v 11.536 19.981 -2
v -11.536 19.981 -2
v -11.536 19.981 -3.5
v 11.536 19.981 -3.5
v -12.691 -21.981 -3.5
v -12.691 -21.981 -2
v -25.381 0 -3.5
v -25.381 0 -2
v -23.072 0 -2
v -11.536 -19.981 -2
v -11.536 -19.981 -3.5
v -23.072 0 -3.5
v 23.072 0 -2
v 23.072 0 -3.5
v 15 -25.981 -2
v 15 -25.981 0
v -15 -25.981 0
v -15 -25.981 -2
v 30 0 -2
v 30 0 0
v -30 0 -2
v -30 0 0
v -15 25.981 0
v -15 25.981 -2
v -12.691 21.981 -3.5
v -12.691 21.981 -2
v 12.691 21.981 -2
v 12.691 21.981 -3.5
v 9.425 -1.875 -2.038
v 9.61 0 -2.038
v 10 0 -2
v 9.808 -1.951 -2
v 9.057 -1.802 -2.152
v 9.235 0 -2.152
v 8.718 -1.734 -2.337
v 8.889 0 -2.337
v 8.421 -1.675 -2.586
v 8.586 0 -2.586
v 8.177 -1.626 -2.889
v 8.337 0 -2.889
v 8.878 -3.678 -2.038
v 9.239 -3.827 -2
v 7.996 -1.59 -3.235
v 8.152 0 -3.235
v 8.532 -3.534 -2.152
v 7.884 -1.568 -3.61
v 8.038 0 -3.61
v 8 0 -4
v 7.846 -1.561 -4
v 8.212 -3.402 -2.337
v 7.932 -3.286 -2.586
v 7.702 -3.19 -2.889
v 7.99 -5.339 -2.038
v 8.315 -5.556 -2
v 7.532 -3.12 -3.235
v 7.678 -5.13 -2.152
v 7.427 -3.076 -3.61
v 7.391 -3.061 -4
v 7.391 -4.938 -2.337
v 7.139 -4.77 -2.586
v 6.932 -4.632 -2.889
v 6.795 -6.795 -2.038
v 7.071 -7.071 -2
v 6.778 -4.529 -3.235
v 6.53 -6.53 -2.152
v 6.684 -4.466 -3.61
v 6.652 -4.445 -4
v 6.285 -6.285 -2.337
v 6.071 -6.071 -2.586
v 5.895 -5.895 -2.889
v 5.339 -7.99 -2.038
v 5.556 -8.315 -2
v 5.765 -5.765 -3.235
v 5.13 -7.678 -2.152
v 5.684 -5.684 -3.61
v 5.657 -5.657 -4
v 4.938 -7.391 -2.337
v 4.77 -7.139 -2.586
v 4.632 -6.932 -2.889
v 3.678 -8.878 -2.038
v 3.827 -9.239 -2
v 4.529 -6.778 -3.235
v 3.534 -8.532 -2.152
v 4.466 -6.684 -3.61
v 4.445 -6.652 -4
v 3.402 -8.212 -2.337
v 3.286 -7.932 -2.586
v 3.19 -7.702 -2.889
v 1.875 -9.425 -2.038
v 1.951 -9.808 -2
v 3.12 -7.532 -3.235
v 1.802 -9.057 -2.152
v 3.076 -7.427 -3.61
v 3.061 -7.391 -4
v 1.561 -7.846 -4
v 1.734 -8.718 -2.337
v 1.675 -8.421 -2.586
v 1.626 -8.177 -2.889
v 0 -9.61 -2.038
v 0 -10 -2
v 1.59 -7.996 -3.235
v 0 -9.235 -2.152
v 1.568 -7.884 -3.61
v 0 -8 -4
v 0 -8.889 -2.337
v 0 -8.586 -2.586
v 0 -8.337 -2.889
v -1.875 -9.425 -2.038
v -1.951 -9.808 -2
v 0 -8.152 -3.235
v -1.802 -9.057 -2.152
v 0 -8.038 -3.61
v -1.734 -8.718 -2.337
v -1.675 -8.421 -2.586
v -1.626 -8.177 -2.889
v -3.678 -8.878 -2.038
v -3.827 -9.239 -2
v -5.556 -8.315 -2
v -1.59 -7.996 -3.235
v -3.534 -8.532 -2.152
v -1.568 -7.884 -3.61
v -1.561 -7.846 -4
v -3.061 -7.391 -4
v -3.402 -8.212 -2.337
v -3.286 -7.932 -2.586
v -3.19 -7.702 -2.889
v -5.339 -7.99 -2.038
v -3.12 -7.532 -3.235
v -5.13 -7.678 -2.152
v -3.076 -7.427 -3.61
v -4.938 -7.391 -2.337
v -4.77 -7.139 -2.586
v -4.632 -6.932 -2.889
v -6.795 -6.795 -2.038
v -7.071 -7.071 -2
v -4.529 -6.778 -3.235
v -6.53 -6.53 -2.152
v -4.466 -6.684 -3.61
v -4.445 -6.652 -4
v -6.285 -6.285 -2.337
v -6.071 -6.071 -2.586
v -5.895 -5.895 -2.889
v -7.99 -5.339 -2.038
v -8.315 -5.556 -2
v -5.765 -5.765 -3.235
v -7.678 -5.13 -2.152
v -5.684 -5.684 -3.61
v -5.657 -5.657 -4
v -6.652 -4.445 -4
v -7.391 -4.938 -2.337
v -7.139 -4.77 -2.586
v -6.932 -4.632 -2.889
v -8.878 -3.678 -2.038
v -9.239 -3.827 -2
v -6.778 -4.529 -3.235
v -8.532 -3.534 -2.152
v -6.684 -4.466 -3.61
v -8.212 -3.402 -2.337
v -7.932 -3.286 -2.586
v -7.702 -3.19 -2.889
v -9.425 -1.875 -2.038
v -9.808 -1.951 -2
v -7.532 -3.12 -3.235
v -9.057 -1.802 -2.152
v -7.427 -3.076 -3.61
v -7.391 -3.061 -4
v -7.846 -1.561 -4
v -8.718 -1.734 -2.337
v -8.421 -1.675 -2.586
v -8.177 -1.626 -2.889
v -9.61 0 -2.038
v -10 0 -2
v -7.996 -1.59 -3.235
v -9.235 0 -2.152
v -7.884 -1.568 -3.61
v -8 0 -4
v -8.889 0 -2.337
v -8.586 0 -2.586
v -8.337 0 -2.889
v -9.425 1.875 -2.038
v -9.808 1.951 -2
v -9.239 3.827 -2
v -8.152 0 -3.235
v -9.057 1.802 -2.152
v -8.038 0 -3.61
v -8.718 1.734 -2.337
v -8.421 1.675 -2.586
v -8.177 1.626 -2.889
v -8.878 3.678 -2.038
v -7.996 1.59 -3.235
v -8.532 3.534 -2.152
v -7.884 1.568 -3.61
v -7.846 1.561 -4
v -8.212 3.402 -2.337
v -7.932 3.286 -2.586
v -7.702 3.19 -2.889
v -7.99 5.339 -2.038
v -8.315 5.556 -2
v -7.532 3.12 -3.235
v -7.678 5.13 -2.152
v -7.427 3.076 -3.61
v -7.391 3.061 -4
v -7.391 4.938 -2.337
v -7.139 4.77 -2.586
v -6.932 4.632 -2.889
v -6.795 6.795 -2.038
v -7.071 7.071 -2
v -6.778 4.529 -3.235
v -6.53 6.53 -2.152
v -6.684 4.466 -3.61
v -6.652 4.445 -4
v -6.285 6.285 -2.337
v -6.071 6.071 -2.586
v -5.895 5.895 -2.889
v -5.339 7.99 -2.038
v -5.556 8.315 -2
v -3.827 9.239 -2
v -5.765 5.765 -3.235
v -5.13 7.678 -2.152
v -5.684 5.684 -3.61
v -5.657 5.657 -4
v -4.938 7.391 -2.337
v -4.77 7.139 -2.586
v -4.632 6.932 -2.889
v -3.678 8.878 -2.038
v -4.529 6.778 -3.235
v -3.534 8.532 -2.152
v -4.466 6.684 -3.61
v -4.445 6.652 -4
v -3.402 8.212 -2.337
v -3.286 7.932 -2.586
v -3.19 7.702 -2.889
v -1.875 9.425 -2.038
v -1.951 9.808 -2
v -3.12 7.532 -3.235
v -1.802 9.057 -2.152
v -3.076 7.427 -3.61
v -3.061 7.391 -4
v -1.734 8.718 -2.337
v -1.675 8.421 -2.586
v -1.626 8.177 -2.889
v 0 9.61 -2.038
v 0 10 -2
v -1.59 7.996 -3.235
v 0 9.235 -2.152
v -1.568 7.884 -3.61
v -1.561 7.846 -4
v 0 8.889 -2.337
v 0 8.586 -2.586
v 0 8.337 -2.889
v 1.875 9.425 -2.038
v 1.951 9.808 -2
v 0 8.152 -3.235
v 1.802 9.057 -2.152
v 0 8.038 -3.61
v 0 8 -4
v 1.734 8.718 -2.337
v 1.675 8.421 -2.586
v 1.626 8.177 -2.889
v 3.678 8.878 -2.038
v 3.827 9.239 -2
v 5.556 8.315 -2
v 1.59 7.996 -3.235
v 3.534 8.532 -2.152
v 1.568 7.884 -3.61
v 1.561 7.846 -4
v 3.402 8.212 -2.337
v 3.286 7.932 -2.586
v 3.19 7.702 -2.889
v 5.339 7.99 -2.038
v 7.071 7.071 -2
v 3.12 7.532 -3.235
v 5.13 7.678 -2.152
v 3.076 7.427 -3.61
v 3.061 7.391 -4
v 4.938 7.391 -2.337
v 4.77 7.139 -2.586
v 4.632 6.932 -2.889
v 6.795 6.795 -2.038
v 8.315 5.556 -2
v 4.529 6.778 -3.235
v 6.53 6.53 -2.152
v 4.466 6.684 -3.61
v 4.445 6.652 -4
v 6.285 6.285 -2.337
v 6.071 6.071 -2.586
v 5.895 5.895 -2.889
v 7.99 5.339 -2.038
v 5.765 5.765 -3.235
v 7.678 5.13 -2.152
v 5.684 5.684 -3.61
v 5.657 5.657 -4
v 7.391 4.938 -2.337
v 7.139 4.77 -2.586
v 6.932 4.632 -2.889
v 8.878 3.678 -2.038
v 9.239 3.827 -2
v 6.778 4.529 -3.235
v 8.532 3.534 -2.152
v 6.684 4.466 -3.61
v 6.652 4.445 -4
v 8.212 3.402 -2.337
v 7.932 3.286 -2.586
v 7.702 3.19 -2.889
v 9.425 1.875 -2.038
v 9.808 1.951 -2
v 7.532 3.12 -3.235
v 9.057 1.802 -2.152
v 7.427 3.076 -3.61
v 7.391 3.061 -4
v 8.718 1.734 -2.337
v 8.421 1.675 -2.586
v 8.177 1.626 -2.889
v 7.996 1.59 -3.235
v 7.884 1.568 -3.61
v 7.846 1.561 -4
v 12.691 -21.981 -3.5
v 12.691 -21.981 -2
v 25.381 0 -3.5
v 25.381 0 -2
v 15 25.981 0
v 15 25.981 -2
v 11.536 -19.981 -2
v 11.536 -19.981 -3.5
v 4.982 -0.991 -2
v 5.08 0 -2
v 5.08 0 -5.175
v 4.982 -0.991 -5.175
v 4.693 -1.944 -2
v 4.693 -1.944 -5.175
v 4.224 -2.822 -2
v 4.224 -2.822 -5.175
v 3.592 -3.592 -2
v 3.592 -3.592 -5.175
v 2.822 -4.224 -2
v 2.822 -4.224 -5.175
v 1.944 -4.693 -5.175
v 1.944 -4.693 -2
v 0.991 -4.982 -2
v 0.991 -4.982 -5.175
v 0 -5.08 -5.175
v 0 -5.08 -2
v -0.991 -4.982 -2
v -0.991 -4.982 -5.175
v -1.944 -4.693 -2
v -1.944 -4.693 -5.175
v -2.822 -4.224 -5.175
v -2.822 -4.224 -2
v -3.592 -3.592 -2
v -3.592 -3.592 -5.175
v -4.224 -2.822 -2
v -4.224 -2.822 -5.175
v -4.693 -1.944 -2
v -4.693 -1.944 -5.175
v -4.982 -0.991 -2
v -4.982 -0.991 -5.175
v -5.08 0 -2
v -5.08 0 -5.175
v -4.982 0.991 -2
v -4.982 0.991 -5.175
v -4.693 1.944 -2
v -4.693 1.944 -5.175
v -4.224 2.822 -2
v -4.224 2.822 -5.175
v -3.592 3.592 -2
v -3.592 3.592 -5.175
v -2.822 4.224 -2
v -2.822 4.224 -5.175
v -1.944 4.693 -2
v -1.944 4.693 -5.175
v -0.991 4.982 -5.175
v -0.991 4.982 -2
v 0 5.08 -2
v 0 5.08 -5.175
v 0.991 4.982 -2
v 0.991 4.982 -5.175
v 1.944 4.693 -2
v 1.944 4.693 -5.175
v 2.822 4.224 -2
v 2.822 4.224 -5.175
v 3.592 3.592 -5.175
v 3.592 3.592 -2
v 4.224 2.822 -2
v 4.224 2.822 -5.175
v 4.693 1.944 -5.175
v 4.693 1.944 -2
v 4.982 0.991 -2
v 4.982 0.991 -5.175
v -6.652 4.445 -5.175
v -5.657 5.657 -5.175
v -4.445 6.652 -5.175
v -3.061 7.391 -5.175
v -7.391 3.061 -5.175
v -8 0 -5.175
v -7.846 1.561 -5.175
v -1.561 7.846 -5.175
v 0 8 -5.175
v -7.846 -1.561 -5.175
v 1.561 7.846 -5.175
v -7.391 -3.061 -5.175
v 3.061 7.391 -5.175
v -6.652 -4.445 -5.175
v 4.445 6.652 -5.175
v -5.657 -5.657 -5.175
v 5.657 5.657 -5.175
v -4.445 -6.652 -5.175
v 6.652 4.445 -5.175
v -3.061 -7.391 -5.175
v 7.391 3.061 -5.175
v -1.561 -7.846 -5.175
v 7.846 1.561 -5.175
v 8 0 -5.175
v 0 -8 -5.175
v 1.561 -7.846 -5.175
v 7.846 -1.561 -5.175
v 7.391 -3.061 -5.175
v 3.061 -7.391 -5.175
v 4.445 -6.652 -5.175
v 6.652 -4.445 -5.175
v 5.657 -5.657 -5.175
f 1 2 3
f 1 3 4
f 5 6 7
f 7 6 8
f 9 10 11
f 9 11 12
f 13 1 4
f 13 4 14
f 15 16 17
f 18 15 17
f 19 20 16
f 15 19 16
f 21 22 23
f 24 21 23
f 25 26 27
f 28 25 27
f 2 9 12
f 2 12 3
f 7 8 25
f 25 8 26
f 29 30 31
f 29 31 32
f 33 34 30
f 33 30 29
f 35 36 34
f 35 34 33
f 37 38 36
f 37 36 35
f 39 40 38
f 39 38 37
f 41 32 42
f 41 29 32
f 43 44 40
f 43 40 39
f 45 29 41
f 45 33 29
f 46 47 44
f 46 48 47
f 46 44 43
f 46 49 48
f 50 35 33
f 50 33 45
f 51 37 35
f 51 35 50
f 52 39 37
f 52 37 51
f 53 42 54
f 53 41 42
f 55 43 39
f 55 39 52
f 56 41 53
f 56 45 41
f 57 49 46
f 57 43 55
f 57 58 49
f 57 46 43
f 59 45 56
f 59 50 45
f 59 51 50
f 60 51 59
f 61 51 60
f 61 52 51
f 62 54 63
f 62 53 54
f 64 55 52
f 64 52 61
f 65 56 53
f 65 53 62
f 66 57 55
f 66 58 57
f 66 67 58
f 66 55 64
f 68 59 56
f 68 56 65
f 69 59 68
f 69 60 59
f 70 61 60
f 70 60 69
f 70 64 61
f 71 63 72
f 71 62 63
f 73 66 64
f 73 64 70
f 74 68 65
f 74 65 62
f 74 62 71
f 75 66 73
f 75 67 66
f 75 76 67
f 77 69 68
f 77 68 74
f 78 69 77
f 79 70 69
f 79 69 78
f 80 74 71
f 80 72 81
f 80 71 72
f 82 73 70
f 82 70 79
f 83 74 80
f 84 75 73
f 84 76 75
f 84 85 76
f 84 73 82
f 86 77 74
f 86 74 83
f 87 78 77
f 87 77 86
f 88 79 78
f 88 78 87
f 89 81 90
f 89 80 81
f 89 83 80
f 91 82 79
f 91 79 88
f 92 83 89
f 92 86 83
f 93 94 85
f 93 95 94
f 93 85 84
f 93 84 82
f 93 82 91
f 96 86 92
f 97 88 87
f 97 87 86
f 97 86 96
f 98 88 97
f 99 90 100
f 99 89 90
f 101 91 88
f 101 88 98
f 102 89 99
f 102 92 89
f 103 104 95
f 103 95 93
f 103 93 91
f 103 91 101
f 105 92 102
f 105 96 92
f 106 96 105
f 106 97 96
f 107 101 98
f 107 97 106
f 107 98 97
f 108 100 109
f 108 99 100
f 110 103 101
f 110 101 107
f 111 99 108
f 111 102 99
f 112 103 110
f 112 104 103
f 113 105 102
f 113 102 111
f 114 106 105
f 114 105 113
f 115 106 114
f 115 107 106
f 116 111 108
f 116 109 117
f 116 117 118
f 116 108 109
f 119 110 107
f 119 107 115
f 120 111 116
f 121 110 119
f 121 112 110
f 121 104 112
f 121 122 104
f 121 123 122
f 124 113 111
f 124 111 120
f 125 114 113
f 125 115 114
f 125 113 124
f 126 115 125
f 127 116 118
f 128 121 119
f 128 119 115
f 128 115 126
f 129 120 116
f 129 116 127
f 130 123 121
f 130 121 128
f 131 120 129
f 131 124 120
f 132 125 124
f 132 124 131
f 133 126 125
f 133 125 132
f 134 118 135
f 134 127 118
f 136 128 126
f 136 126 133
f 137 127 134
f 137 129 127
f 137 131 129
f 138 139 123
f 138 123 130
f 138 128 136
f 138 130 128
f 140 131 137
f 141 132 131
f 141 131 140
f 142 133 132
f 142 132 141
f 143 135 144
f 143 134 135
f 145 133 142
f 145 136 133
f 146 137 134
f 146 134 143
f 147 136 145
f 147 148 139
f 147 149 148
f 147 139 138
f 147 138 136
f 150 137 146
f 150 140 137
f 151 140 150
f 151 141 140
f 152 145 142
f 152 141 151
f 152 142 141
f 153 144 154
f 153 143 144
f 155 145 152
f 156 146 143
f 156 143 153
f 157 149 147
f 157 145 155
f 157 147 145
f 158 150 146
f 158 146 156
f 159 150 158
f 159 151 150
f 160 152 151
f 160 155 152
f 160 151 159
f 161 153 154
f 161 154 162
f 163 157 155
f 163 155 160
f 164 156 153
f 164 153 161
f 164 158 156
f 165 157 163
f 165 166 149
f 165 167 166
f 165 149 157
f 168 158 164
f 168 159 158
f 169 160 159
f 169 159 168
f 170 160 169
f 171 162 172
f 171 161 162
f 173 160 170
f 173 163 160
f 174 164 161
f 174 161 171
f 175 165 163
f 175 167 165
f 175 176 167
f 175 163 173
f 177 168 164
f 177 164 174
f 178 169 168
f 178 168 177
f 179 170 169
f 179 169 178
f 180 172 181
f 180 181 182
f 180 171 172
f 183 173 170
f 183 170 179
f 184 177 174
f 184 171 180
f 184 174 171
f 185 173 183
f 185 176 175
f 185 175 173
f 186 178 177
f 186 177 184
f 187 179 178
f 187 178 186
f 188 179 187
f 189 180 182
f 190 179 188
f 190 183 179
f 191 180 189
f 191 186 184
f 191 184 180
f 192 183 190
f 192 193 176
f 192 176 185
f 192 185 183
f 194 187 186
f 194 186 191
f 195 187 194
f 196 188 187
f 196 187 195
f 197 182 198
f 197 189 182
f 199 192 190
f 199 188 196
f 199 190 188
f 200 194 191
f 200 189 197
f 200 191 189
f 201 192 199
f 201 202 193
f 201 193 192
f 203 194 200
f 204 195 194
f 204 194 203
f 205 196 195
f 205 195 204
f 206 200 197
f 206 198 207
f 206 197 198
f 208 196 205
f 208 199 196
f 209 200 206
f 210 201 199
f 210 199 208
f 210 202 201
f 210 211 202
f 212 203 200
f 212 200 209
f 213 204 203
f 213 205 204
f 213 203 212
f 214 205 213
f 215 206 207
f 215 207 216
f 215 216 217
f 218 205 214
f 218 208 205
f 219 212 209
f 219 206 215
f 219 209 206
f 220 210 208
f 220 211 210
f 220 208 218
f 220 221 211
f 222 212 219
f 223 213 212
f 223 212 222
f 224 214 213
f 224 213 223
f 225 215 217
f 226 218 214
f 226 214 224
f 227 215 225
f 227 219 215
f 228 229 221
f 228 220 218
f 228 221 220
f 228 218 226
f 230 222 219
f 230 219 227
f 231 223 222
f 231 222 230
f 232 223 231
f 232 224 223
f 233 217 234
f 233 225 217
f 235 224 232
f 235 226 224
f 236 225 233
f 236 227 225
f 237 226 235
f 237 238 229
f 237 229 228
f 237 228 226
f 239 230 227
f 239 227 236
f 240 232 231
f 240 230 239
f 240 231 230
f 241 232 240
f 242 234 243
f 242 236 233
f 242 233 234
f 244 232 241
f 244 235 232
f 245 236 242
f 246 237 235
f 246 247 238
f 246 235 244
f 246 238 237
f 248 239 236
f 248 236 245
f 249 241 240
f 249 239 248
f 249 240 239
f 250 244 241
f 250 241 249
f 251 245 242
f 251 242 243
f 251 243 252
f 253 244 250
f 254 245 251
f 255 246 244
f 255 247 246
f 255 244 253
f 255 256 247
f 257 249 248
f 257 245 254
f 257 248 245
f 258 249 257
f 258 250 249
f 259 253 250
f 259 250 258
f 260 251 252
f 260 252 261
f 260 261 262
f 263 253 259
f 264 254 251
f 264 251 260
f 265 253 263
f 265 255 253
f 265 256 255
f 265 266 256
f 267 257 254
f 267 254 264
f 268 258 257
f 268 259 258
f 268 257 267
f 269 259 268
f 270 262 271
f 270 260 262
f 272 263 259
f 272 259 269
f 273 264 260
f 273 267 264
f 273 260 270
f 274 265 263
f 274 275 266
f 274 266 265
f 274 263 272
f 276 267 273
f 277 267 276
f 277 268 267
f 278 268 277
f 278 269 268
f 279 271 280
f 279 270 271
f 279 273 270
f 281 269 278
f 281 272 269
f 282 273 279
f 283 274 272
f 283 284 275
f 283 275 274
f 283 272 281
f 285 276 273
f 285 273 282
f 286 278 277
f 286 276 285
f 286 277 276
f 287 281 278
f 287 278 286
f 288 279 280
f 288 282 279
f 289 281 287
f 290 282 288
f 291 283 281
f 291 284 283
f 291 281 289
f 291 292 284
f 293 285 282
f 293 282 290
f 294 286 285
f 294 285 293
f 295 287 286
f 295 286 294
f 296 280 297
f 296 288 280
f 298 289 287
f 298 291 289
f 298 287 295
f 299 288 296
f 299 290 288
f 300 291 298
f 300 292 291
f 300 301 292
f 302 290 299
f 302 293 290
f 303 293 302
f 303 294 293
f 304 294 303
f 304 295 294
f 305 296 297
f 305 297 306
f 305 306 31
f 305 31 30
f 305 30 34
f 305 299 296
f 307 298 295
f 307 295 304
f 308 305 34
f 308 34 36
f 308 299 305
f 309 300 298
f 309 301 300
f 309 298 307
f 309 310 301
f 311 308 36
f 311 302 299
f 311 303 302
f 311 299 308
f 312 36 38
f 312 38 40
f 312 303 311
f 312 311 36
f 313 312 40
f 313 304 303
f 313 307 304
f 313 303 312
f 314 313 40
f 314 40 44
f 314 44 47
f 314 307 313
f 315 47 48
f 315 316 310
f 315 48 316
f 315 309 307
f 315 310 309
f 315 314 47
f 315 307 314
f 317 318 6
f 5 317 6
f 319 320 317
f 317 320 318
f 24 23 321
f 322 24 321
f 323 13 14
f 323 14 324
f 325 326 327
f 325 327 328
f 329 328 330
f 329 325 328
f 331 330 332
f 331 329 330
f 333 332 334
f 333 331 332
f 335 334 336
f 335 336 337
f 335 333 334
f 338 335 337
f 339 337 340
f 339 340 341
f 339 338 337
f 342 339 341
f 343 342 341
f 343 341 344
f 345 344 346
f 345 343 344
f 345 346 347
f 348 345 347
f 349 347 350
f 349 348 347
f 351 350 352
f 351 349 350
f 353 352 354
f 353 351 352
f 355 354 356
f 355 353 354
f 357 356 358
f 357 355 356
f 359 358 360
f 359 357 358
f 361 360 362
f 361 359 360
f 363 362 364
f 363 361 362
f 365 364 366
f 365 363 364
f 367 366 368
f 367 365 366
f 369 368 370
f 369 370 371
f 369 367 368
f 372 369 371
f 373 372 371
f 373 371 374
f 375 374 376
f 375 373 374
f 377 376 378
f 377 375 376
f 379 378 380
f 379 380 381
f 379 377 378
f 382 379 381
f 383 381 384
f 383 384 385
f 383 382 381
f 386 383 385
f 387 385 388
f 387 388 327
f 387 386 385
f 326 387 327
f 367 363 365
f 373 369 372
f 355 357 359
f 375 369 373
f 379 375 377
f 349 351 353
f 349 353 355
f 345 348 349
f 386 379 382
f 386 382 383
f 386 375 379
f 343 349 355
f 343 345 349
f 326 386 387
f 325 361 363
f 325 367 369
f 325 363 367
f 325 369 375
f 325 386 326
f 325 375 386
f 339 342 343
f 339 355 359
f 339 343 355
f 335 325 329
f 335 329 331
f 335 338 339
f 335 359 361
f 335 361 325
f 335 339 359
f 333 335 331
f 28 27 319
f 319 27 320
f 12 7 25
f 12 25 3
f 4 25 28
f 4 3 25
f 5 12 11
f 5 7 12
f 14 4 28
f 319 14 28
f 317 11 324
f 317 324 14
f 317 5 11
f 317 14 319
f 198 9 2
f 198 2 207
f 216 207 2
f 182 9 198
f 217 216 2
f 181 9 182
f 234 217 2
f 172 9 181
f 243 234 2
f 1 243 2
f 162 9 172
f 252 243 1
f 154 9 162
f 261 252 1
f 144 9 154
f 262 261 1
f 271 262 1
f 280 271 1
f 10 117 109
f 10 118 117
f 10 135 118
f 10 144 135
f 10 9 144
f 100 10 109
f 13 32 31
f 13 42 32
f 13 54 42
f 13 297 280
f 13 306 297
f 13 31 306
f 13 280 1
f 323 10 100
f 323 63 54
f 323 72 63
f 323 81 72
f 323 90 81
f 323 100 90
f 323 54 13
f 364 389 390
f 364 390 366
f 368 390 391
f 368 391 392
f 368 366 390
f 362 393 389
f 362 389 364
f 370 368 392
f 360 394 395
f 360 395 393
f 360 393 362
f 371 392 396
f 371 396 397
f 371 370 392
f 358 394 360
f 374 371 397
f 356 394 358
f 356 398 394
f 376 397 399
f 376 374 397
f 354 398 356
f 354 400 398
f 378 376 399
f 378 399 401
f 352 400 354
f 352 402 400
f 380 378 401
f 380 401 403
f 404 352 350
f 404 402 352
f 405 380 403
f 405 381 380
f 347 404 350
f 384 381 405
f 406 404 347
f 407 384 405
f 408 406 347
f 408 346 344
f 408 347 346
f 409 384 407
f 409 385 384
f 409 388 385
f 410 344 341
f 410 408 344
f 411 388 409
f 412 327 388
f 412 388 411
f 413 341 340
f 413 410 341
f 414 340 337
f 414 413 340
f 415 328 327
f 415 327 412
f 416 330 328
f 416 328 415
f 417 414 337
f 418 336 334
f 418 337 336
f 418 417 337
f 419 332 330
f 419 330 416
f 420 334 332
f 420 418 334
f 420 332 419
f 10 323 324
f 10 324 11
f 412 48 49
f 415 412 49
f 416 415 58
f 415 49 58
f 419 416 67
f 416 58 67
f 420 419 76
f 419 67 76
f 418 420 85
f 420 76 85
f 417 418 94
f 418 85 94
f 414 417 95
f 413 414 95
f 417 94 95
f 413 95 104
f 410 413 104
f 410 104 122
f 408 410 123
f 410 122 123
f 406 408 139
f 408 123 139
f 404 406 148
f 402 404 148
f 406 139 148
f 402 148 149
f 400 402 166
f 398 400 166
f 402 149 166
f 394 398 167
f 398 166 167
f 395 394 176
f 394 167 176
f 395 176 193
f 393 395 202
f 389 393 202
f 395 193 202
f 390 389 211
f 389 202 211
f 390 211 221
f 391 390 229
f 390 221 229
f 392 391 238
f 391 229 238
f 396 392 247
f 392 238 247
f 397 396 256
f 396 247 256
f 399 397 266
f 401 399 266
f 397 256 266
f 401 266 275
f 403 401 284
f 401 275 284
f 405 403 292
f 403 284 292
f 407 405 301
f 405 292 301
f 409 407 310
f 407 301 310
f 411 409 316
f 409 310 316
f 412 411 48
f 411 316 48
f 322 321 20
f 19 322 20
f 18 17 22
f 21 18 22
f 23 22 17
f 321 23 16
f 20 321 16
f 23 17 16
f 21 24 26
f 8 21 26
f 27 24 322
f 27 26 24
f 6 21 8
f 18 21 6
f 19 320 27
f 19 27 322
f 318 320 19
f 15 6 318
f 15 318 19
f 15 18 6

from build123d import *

# Parameters (mm, degrees)
PAD_DEPTH     = 2
SKETCH001_R   = 8
SKETCH001_R_2 = 5.08
PAD001_DEPTH  = 3.175
FILLET_R      = 2
PAD002_DEPTH  = 1.5


with BuildPart() as part:
    # Sketch → Pad (new body)
    with BuildSketch(Plane(origin=(0, 0, 0), x_dir=(1, 0, 0), z_dir=(0, 0, -1))):
        Polygon((30, 0), (15, 25.980762), (-15, 25.980762), (-30, 0), (-15, -25.980762), (15, -25.980762), align=None)
    extrude(amount=PAD_DEPTH)

    # Sketch001 → Pad001 (new body)
    with BuildSketch(Plane(origin=(0, 0, -2), x_dir=(1, 0, 0), z_dir=(0, 0, -1))):
        Circle(SKETCH001_R)
        Circle(SKETCH001_R_2, mode=Mode.SUBTRACT)
    extrude(amount=PAD001_DEPTH)

    # Fillet
    fillet_edges = [part.edges().sort_by_distance(p)[0] for p in [
        (-8, 0, -2),
    ]]
    fillet(fillet_edges, radius=FILLET_R)

    # Sketch002 → Pad002 (new body)
    with BuildSketch(Plane(origin=(0, 0, -2), x_dir=(1, 0, 0), z_dir=(0, 0, -1))):
        Polygon((12.690599, -21.980762), (25.381198, 0), (12.690599, 21.980762), (-12.690599, 21.980762), (-25.381198, 0), (-12.690599, -21.980762), align=None)
        Polygon((11.535898, -19.980762), (23.071797, 0), (11.535898, 19.980762), (-11.535898, 19.980762), (-23.071797, 0), (-11.535898, -19.980762), align=None, mode=Mode.SUBTRACT)
    extrude(amount=PAD002_DEPTH)


solid = part.part
